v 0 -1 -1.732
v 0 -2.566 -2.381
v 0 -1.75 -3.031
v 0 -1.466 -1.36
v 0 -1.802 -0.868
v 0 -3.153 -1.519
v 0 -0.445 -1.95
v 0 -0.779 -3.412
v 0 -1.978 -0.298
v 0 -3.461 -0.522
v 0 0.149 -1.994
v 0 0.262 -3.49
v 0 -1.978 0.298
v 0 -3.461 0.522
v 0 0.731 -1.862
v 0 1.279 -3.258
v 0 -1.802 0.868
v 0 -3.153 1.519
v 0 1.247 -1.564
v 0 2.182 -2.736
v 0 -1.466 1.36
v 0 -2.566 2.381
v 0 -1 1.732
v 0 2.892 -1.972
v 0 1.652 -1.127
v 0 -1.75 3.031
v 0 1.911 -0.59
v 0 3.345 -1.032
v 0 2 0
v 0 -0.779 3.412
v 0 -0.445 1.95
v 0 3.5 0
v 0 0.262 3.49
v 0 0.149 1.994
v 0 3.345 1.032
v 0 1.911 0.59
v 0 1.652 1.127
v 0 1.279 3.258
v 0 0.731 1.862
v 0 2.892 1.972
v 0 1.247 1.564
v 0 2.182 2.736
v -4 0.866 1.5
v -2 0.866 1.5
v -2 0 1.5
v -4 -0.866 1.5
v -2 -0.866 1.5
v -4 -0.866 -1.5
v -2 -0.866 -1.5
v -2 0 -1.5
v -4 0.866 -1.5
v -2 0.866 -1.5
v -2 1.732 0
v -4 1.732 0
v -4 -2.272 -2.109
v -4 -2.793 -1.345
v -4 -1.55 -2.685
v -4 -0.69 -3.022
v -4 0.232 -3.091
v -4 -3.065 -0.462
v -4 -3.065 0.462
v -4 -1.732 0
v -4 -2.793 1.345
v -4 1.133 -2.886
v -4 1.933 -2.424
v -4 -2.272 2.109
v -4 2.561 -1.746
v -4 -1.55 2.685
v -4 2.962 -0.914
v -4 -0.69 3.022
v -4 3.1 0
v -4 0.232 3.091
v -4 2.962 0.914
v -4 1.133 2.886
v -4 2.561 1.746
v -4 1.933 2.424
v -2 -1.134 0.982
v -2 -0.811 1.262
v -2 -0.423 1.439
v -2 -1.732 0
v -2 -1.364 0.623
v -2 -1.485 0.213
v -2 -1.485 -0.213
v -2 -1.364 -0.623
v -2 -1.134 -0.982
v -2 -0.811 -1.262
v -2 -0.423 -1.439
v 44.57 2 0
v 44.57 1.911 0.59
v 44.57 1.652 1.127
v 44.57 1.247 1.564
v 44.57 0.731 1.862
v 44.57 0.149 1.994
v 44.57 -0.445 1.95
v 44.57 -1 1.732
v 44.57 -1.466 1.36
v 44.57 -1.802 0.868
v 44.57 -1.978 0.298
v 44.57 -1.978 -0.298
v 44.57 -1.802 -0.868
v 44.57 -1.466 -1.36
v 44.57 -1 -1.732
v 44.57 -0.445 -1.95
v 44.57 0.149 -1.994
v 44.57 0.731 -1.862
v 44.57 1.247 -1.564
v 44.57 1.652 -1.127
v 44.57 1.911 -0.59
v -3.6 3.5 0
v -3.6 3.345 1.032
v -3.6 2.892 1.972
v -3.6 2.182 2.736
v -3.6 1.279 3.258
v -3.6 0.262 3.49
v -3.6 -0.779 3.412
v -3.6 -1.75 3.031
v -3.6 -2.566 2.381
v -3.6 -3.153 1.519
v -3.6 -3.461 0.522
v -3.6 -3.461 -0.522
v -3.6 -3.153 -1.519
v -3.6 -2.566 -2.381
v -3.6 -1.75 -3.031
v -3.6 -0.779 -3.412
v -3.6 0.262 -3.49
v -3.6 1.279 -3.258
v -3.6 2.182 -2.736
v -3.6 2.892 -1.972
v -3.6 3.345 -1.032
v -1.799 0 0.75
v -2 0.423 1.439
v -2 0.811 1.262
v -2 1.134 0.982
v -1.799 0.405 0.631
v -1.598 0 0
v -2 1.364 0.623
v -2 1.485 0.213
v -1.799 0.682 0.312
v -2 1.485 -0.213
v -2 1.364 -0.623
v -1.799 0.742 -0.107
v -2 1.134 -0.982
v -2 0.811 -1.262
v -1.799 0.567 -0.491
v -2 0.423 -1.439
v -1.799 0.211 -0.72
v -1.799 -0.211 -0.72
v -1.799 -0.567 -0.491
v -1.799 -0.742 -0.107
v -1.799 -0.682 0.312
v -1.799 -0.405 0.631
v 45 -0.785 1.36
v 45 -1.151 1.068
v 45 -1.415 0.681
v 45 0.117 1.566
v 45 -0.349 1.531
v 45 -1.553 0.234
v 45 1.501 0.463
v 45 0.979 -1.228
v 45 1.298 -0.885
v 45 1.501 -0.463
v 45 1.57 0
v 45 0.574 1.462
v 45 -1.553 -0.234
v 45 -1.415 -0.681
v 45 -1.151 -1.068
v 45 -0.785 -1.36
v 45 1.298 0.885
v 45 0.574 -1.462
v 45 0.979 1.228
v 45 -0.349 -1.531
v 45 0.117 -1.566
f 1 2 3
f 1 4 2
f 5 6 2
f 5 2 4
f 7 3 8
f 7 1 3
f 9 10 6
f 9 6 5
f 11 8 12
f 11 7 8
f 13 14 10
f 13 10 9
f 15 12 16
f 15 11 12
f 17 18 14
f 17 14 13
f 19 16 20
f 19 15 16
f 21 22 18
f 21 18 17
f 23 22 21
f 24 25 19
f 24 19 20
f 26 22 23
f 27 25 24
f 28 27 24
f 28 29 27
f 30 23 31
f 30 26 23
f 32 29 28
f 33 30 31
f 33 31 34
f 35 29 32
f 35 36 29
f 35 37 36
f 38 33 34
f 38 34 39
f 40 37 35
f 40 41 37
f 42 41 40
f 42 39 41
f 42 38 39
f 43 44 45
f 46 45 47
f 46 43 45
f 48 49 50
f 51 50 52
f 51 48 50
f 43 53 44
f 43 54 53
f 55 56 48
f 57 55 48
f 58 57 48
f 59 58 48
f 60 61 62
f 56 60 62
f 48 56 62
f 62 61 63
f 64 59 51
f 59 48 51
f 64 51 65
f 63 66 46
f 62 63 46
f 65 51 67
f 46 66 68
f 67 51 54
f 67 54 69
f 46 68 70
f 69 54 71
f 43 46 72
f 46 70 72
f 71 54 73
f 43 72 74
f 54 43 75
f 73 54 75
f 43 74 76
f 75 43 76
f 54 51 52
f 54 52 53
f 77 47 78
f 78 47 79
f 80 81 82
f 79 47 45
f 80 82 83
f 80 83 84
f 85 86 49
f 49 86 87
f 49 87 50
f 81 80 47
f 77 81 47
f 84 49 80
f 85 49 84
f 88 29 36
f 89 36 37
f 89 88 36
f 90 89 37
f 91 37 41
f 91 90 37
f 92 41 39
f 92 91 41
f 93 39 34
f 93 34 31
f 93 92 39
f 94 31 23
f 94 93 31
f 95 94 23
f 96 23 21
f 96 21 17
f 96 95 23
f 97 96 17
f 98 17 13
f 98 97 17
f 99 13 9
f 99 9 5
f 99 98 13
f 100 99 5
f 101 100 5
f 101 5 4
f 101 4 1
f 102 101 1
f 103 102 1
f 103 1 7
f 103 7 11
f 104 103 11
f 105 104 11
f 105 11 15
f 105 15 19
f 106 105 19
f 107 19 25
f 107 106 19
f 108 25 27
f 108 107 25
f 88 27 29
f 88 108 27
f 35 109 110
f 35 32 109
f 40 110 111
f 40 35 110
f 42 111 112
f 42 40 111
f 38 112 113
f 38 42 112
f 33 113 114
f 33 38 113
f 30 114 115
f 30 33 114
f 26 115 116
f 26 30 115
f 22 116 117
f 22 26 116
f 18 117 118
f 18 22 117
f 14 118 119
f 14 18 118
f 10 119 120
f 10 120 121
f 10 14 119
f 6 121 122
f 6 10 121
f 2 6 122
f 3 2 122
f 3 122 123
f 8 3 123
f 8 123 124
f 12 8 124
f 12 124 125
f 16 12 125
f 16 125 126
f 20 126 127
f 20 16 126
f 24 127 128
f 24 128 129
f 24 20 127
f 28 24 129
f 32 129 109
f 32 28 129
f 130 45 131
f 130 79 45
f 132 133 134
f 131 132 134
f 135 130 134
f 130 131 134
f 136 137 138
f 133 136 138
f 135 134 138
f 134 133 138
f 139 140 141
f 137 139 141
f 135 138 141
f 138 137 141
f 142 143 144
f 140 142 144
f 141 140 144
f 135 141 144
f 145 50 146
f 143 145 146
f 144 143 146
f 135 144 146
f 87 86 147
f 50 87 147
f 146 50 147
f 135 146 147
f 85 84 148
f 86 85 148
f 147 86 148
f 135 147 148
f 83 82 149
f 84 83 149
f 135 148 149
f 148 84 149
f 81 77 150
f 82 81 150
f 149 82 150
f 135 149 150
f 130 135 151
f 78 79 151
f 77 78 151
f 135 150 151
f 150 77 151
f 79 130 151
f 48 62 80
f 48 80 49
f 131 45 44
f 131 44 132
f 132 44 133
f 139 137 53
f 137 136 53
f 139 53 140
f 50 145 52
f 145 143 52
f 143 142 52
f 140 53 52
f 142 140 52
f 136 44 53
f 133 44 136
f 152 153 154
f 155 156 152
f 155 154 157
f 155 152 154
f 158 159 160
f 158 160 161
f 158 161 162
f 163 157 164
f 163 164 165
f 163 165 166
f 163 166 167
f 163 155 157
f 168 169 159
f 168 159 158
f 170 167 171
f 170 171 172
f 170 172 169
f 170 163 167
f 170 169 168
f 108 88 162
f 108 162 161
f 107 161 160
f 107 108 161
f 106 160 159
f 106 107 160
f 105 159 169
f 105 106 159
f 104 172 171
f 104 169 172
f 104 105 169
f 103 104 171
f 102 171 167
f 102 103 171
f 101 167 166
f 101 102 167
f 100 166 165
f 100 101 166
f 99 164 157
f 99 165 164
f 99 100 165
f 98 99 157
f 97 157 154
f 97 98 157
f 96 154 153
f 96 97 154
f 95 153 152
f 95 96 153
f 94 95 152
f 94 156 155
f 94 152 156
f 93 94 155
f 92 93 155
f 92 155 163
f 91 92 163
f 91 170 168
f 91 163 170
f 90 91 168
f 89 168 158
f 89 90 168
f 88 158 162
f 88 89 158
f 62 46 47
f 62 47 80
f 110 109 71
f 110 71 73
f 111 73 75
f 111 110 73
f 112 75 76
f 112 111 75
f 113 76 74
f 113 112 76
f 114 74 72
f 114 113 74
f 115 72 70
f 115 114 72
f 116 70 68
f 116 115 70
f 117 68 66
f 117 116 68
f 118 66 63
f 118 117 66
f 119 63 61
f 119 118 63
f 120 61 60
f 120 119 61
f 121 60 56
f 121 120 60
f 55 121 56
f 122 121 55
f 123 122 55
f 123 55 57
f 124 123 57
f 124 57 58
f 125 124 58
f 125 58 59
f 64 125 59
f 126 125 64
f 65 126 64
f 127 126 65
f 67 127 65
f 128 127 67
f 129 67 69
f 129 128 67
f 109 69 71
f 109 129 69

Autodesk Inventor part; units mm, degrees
sketch "Sketch_2" plane through (0, 0, 0) normal (0, 0, 1) x (1, 0, 0)
  line L0 (45, 0) -> (-4, 0)
  line L1 (-4, 0) -> (-4, 3.1)
  line L2 (-4, 3.1) -> (-3.6, 3.5)
  line L3 (-3.6, 3.5) -> (0, 3.5)
  line L4 (0, 3.5) -> (0, 2)
  line L5 (0, 2) -> (44.5705, 2)
  line L6 (44.5705, 2) -> (45, 1.5705)
  line L7 (45, 1.5705) -> (45, 0)
  line L8 (45, 0) -> (-4, 0)
revolve "Revolution1" add sketch "Sketch_2" angle 360 about axis through (45, 0, 0) along (1, 0, 0)
thread "Thread1" size "M4x0.7" class "6g" standard "ISO Metric profile" length 19.5705
sketch "Sketch2" plane through (-4, 0, 0) normal (-1, 0, 0) x (0, 0, 1)
  point P0 (0, 0)
hole "Hole1" at (-4, 0, 0) direction (1, 0, 0) diameter 3 depth 2 tip angle 150
sketch "Sketch_3" plane through (-4, 0, 0) normal (1, 0, 0) x (0, 0, -1)
  line L0 (-1.5, -0.866) -> (0, -1.7321)
  line L1 (0, -1.7321) -> (1.5, -0.866)
  line L2 (1.5, -0.866) -> (1.5, 0.866)
  line L3 (1.5, 0.866) -> (0, 1.7321)
  line L4 (0, 1.7321) -> (-1.5, 0.866)
  line L5 (-1.5, 0.866) -> (-1.5, -0.866)
extrude "Extrusion1" cut sketch "Sketch_3" along normal blind 2
ref_plane "bolt_to_nut_XY" through (45, 0, 0) normal (1, 0, 0) x (0, 0, -1)
ref_plane "bolt_to_nut_YZ" through (45, 0, 0) normal (0, 0, -1) x (0, 1, 0)
ref_plane "bolt_to_nut_ZX" through (45, 0, 0) normal (0, 1, 0) x (1, 0, 0)
ref_plane "screw1_XY" through (0, 0, 0) normal (1, 0, 0) x (0, 0, -1)
ref_plane "screw1_YZ" through (0, 0, 0) normal (0, 0, -1) x (0, 1, 0)
ref_plane "screw1_ZX" through (0, 0, 0) normal (0, 1, 0) x (1, 0, 0)
properties part number "CB4-45" material "鋼、炭素鋼"
